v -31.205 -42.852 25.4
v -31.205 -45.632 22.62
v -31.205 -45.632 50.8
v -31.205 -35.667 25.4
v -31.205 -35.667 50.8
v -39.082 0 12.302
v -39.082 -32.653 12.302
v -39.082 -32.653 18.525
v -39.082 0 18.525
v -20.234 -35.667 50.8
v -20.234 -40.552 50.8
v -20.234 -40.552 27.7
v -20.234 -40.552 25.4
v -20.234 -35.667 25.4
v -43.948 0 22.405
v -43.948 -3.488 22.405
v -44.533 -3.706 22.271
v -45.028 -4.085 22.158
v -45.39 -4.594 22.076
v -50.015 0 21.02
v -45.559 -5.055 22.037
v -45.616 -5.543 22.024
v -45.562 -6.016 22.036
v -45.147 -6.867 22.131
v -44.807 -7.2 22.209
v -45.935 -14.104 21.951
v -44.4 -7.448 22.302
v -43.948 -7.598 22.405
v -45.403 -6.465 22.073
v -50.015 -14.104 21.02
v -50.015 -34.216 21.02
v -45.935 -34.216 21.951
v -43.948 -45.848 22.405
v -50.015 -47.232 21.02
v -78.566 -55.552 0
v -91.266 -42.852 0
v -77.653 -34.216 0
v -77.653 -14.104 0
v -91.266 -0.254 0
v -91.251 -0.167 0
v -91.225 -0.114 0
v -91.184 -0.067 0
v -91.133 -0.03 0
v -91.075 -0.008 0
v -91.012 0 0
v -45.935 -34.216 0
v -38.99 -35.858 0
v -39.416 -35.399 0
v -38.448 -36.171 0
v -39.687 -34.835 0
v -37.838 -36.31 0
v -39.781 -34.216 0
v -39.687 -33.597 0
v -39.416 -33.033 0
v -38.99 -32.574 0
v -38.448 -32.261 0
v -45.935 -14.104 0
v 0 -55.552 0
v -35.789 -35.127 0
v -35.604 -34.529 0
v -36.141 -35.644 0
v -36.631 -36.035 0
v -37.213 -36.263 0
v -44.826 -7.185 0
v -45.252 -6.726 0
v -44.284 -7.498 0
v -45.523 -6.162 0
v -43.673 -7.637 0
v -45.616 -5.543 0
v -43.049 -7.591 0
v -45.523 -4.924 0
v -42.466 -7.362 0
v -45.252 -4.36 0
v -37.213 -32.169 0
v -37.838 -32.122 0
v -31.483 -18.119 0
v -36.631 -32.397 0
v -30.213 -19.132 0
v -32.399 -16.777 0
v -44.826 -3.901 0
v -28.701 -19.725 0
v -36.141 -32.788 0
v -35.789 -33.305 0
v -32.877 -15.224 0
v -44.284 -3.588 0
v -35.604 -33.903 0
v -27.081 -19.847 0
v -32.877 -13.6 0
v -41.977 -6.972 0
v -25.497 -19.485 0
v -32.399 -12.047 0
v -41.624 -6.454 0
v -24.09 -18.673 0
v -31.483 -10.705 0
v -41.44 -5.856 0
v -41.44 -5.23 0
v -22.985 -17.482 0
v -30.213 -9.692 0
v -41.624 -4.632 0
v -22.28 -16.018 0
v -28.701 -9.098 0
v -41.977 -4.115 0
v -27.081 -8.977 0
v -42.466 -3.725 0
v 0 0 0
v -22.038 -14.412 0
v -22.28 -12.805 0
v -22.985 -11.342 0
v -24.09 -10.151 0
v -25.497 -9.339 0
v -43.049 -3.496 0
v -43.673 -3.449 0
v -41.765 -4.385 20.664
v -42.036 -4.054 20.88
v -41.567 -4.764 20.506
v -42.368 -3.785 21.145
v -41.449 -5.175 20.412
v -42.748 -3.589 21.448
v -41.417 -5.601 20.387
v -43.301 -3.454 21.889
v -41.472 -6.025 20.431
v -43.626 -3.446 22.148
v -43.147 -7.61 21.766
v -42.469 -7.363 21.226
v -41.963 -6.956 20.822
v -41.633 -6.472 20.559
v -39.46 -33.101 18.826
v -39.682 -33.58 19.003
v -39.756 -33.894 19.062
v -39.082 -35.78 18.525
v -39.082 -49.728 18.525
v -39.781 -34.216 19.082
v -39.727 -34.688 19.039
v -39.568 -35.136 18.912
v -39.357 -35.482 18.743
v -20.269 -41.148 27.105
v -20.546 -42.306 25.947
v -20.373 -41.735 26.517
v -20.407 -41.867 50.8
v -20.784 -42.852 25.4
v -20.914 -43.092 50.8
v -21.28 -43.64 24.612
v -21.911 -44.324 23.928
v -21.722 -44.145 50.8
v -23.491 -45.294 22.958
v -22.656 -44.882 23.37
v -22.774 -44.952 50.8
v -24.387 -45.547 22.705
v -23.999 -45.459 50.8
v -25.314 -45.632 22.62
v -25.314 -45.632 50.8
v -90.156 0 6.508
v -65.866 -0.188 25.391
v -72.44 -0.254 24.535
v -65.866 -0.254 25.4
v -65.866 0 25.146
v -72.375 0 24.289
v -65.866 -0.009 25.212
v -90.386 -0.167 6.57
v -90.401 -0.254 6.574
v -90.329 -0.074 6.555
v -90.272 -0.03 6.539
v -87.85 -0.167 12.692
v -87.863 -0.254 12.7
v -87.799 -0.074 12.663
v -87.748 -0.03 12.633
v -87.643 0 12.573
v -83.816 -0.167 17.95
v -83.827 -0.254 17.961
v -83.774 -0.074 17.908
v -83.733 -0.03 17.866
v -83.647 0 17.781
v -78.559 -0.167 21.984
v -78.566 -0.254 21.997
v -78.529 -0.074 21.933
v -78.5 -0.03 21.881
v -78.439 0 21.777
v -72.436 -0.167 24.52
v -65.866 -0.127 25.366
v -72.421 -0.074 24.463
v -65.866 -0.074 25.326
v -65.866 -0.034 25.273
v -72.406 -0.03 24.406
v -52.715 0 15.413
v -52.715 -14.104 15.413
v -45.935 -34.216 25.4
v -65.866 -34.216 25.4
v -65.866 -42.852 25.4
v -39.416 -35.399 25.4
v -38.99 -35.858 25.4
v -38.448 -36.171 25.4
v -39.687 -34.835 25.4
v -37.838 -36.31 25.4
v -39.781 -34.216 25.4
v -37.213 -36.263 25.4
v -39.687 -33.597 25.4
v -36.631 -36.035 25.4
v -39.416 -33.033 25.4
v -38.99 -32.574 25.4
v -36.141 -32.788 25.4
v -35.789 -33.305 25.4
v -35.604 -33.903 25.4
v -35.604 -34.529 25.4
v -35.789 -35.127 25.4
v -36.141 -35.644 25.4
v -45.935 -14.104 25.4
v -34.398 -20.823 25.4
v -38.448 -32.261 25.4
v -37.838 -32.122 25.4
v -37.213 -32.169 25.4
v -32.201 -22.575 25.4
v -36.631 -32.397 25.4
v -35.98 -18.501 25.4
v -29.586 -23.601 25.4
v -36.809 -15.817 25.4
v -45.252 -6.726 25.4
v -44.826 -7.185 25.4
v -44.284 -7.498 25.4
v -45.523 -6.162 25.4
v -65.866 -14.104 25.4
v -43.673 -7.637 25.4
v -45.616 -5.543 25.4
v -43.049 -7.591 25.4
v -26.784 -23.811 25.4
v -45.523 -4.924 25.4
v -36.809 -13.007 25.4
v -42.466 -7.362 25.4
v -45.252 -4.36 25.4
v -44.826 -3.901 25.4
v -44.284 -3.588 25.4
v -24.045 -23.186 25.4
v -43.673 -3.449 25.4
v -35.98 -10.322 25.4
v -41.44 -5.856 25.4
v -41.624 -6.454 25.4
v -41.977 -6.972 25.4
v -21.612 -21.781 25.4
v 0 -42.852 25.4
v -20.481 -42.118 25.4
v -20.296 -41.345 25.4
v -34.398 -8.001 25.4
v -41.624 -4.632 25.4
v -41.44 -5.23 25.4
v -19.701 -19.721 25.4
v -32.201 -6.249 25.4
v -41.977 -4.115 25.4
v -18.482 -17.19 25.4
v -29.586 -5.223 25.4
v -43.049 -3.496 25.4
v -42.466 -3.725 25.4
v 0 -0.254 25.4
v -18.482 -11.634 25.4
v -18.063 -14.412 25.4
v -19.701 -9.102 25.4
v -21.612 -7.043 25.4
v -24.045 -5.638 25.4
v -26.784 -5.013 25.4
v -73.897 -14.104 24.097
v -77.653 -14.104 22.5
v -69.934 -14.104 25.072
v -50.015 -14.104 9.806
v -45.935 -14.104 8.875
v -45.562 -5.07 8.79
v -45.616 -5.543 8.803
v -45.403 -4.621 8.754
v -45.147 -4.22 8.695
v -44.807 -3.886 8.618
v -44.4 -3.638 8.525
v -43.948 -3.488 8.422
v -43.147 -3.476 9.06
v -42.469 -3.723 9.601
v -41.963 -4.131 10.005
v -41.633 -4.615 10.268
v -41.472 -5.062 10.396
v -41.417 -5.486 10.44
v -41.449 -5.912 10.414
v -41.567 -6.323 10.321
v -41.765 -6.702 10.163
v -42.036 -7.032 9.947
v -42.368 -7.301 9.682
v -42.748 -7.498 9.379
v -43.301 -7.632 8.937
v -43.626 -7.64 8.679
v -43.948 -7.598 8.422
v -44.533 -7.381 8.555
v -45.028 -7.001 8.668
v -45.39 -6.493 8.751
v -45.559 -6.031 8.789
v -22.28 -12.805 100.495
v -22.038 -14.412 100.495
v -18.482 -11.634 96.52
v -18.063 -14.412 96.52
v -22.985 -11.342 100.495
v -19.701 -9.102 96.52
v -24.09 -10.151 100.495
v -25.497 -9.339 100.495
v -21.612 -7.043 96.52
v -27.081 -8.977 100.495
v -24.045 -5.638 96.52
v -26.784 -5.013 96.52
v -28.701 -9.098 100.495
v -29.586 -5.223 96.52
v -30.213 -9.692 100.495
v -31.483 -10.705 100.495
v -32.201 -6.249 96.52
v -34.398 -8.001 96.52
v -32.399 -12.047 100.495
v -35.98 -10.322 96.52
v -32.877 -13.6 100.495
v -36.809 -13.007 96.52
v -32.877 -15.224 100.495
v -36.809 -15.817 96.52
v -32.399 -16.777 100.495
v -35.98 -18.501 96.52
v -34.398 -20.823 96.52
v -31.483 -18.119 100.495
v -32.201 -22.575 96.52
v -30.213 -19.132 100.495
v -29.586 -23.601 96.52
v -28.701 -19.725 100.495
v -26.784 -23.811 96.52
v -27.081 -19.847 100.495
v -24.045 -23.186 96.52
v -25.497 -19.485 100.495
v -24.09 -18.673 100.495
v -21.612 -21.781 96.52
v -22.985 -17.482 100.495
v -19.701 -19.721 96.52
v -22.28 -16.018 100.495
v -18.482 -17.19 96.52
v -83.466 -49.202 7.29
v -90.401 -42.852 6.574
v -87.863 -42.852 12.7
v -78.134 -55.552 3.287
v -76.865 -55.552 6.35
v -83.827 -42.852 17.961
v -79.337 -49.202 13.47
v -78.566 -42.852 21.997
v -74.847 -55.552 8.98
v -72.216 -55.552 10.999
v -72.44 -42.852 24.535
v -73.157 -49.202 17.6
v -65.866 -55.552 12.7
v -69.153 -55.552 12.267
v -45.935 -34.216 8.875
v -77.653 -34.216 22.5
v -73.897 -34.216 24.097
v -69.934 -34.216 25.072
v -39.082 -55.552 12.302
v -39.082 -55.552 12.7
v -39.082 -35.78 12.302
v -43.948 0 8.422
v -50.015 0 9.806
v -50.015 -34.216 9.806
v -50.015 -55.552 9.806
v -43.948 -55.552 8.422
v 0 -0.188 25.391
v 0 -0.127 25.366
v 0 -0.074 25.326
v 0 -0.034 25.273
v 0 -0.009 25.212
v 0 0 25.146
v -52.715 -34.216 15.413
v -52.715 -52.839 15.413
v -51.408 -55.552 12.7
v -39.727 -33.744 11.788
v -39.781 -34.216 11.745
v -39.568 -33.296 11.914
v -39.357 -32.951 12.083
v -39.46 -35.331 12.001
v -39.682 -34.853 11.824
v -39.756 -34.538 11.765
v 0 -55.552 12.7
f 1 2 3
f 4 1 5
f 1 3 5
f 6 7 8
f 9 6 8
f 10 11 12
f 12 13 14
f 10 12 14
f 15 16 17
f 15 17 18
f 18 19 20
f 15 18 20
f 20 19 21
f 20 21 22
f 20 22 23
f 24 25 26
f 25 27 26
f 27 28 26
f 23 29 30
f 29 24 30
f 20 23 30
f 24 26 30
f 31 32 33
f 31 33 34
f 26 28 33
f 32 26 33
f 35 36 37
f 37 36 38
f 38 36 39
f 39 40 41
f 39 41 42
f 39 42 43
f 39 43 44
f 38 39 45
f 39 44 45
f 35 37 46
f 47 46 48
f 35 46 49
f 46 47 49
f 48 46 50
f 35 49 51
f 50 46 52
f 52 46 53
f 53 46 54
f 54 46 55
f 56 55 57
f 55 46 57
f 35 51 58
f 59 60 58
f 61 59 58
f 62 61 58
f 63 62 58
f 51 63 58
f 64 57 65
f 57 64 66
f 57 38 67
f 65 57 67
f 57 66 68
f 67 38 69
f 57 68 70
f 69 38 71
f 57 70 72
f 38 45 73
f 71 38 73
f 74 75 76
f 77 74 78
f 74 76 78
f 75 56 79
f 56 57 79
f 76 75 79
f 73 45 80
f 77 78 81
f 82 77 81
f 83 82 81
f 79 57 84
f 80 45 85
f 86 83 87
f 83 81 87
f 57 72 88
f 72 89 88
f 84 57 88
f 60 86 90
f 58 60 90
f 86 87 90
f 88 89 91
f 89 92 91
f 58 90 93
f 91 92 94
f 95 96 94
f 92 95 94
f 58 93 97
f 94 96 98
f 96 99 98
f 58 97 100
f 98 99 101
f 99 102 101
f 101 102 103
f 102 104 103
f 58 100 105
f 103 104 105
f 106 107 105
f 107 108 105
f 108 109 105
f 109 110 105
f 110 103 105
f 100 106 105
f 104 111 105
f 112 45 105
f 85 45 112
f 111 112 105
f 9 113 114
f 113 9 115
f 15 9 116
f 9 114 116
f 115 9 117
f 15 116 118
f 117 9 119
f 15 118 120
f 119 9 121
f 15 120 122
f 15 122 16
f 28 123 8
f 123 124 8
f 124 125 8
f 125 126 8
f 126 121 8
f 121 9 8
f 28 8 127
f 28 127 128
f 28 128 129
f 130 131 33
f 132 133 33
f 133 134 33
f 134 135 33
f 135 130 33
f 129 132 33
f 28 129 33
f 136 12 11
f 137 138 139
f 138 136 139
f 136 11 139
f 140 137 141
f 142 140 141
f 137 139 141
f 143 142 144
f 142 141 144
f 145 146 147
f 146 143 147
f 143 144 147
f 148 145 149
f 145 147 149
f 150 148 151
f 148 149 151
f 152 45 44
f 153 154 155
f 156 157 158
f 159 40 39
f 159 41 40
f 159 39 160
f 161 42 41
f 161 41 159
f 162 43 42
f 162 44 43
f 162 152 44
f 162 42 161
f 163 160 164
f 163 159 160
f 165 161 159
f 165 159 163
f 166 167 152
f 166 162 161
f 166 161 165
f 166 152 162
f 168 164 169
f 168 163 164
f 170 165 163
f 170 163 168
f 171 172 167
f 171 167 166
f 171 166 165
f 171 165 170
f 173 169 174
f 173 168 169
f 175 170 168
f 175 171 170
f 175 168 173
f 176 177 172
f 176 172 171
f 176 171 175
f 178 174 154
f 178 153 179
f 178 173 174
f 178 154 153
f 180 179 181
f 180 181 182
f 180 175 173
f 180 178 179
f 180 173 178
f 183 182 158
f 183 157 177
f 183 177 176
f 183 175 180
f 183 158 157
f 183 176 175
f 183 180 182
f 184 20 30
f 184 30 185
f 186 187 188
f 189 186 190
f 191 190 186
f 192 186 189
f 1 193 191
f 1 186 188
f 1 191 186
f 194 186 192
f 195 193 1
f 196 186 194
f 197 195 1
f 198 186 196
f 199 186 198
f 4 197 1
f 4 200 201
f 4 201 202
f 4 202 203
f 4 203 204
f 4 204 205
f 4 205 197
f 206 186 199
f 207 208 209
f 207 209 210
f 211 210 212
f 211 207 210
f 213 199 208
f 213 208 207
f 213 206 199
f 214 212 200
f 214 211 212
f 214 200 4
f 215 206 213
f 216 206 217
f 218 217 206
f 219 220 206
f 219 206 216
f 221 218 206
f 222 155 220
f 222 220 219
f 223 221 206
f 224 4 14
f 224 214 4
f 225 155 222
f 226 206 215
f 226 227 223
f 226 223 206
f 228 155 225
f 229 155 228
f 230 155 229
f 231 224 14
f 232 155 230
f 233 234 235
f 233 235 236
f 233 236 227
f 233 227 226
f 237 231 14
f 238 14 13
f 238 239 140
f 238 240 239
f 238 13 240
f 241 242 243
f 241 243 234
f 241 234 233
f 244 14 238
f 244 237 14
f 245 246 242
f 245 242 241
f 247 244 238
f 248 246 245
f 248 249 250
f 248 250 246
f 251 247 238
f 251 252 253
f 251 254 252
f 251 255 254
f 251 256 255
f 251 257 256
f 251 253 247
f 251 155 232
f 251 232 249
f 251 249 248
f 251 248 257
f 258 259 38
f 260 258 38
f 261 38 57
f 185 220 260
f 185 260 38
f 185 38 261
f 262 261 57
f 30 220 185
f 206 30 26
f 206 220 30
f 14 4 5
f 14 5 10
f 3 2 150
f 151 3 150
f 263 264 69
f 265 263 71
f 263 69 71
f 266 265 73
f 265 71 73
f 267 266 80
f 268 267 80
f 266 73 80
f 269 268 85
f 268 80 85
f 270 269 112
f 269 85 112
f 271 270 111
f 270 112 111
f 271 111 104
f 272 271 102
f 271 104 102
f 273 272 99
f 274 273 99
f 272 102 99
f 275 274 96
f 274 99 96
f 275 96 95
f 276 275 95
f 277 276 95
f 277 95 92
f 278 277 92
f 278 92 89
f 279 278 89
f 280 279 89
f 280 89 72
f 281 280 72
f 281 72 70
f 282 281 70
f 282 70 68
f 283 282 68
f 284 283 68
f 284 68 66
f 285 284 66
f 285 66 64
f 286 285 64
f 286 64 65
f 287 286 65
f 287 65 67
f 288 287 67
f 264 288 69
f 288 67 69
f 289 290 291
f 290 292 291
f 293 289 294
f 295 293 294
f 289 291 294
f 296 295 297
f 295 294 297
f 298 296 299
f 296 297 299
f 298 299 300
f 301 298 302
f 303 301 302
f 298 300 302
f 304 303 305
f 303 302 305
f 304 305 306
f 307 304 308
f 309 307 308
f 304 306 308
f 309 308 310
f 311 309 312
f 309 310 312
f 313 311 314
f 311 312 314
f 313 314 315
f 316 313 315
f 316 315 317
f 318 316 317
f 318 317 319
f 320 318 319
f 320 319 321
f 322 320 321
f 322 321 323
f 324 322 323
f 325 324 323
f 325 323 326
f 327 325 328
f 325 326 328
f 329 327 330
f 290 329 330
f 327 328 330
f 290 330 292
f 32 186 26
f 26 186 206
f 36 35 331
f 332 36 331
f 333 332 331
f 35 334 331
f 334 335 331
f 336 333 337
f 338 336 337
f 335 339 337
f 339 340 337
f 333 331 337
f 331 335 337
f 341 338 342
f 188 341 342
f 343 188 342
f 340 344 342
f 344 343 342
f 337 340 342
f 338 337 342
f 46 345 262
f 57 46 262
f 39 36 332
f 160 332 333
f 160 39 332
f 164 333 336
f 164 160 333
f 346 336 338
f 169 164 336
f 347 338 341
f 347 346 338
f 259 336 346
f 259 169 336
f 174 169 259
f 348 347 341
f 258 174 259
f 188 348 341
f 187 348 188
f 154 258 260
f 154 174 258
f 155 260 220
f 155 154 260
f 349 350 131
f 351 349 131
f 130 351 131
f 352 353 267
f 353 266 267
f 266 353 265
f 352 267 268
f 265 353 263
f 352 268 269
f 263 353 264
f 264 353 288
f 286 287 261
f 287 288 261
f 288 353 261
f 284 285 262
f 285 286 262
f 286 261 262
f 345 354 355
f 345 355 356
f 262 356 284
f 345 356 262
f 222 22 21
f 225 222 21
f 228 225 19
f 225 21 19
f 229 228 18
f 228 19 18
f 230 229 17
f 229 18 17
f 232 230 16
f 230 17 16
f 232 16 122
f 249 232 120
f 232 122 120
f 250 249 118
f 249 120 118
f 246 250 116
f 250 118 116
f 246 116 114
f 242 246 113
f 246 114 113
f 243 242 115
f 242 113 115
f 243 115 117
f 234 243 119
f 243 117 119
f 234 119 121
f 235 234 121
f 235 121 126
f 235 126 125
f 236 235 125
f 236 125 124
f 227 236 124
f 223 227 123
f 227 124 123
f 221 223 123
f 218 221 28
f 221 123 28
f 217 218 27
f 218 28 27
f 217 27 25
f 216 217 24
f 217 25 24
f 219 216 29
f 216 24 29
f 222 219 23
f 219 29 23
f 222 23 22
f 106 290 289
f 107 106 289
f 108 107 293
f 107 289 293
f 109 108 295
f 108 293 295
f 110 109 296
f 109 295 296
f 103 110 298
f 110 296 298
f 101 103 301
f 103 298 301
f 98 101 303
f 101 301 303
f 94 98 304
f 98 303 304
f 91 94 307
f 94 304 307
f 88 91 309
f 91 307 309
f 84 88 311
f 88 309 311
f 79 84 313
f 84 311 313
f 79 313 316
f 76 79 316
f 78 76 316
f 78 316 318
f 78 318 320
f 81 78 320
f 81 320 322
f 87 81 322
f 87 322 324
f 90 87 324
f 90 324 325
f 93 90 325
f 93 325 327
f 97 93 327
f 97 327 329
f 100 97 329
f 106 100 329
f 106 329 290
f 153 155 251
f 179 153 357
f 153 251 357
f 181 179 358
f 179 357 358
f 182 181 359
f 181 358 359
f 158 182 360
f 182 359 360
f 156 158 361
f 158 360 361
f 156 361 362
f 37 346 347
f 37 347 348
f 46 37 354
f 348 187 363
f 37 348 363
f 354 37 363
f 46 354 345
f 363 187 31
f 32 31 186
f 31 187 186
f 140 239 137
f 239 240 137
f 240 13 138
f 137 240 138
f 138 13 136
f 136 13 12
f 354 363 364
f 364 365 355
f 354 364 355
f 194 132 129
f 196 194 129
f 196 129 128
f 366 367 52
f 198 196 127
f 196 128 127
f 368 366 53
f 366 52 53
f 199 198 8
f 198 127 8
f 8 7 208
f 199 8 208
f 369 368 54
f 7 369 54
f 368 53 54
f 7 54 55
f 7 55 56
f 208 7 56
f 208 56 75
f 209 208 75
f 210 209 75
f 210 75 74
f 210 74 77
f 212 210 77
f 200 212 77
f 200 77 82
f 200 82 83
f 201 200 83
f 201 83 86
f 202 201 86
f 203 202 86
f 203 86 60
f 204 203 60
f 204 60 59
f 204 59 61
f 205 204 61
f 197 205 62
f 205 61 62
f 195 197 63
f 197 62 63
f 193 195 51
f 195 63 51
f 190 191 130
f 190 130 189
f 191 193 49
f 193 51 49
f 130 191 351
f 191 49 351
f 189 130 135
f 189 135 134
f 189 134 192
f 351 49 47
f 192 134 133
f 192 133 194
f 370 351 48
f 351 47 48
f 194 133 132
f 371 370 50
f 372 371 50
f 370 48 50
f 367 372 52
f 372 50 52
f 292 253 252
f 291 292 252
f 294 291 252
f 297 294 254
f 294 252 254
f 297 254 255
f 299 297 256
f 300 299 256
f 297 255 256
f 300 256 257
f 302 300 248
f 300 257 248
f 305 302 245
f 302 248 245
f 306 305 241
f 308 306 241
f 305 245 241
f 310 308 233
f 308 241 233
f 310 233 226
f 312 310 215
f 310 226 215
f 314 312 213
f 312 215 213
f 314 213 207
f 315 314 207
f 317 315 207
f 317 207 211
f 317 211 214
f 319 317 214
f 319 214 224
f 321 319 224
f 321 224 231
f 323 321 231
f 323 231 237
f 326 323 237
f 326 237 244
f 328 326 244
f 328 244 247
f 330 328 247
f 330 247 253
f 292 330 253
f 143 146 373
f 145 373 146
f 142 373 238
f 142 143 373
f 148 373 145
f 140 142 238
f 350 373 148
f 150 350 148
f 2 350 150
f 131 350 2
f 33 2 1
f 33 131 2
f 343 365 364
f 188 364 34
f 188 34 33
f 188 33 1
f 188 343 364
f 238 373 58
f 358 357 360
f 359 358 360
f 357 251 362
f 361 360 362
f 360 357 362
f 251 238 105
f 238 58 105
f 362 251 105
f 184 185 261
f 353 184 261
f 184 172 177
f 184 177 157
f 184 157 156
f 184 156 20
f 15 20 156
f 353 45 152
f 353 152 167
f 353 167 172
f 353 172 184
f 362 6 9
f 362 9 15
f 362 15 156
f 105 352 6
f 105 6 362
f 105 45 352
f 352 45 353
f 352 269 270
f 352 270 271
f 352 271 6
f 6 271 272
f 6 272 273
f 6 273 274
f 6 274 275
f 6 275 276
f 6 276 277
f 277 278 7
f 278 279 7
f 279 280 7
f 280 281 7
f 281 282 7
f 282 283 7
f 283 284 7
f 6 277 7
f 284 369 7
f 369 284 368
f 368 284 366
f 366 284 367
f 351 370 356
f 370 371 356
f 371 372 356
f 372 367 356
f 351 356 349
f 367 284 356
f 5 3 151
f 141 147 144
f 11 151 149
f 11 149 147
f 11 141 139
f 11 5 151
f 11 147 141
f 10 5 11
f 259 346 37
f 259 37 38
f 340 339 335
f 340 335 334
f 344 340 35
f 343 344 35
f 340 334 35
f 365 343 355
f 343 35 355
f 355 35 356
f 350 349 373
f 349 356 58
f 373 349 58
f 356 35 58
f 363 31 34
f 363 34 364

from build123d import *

# Parameters (mm, degrees)
F0_W          = 91.2663862109
F0_H          = 55.5524304509
F1_DEPTH      = 25.4
F2_W          = 31.717389822
F2_H          = 20.1121037826
F3_DEPTH      = 25.401
F4_R          = 9.4254777906
F5_DEPTH      = 76.2
F7_DEPTH      = 55.5534304509
F8_R          = 5.4499976888
F9_DEPTH      = 101.601
F10_W         = 10.9715163708
F10_H         = 9.965904057
F11_DEPTH     = 25.4
F12_T1_DEPTH  = 182.5524304509
F13_T4_DEPTH  = 98.5267601581
F13_T10_DEPTH = 98.5267601581
F13_T16_DEPTH = 98.5267601581
F13_T23_DEPTH = 98.5267601581
F13_T29_DEPTH = 98.5267601581
F13_T33_ANGLE = 163.70288589
F15_T4_DEPTH  = 53.5800548494
F15_T10_DEPTH = 53.5800548494
F15_T16_DEPTH = 53.5800548494
F17_D         = 4.2
F18_R         = 0.254


# Not quite as in the source:
# - a fillet or chamfer that OpenCascade refuses, or shapes differently, is made with other operations: its cross-section is extruded or revolved along the edge and cut away or added


with BuildPart() as f1:
    # F0 (on Top) → F1 (new body)
    with BuildSketch(Plane.XY):
        with Locations((-45.6331931055, -27.7762152255)):
            Rectangle(F0_W, F0_H)
    extrude(amount=F1_DEPTH)

    # F2 (on face) → F3 (cut, through all)
    with BuildSketch(Plane.XY.offset(25.4)):
        with Locations((-61.7938265204, -24.1600726731)):
            Rectangle(F2_W, F2_H)
    extrude(amount=-F3_DEPTH, mode=Mode.SUBTRACT)

    # F4 (on face) → F5 (join)
    with BuildSketch(Plane.XY.offset(25.4)):
        with Locations((-27.4883341044, -14.4118471071)):
            Circle(F4_R)
    extrude(amount=F5_DEPTH)

    # F6 (on face) → F7 (cut, through all)
    with BuildSketch(Plane.XZ.offset(55.5524304509)):
        Polygon((-39.0824638307, 12.301723844), (-39.0824638307, 18.5248410342), (-43.9478927691, 22.4048911381), (-50.0149834187, 21.0201172888), (-52.7150927741, 15.4132824391), (-50.0149834187, 9.8064475894), (-43.9478927691, 8.4216737401), align=None)
    extrude(amount=-F7_DEPTH, mode=Mode.SUBTRACT)

    # F8 (on face) → F9 (cut, through all)
    with BuildSketch(Plane.XY.offset(101.6)):
        with Locations((-27.4883341044, -14.4118471071)):
            Circle(F8_R)
    extrude(amount=-F9_DEPTH, mode=Mode.SUBTRACT)

    # F10 (on face) → F11 (join)
    with BuildSketch(Plane.XY.offset(25.4)):
        with Locations((-25.7194377482, -40.6495332718)):
            Rectangle(F10_W, F10_H)
    extrude(amount=F11_DEPTH)

    # F12: fillet of radius 25.4 on 1 edges, made by hand

    # F12_s2 → F12_t1 (cut)
    with BuildSketch(Plane.XZ.offset(-63.5)):
        with BuildLine():
            ThreePointArc((-91.2663862109, 0), (-83.8268984531, 17.9605122421), (-65.8663862109, 25.4))
            Line((-65.8663862109, 25.4), (-91.2663862109, 25.4))
            Line((-91.2663862109, 25.4), (-91.2663862109, 0))
        make_face()
    extrude(amount=F12_T1_DEPTH, mode=Mode.SUBTRACT)

    # F13: chamfer of 12.7 on 1 edges, made by hand


with BuildPart() as f13_tool2:
    # F13_s3 → F13_t4 (new body)
    with BuildSketch(Plane.YZ.offset(-65.8663862109)):
        Polygon((-55.5524304509, 12.7), (-42.8524304509, 25.4), (-55.5524304509, 25.4), align=None)
    extrude(amount=F13_T4_DEPTH)

    split(bisect_by=Plane.YZ.offset(-31.2051959336), keep=Keep.BOTTOM)

    split(bisect_by=Plane.XZ.offset(45.6324853003), keep=Keep.TOP)


with BuildPart() as f1_1:
    add(f1.part)

    # F13_t1: cut F13_tool2
    add(f13_tool2.part, mode=Mode.SUBTRACT)


with BuildPart() as f13_tool8:
    # F13_s9 → F13_t10 (new body)
    with BuildSketch(Plane.YZ.offset(-65.8663862109)):
        Polygon((-55.5524304509, 12.7), (-42.8524304509, 25.4), (-55.5524304509, 25.4), align=None)
    extrude(amount=F13_T10_DEPTH)

    split(bisect_by=Plane.YZ.offset(-31.2051959336), keep=Keep.BOTTOM)

    split(bisect_by=Plane.XZ.offset(45.6324853003), keep=Keep.BOTTOM)


with BuildPart() as f1_2:
    add(f1_1.part)

    # F13_t7: cut F13_tool8
    add(f13_tool8.part, mode=Mode.SUBTRACT)


with BuildPart() as f13_tool14:
    # F13_s15 → F13_t16 (new body)
    with BuildSketch(Plane.YZ.offset(-65.8663862109)):
        Polygon((-55.5524304509, 12.7), (-42.8524304509, 25.4), (-55.5524304509, 25.4), align=None)
    extrude(amount=F13_T16_DEPTH)

    split(bisect_by=Plane.YZ.offset(-20.2336795628), keep=Keep.BOTTOM)

    split(bisect_by=Plane.YZ.offset(-31.2051959336), keep=Keep.TOP)

    split(bisect_by=Plane.XZ.offset(45.6324853003), keep=Keep.TOP)


with BuildPart() as f1_3:
    add(f1_2.part)

    # F13_t13: cut F13_tool14
    add(f13_tool14.part, mode=Mode.SUBTRACT)


with BuildPart() as f13_tool21:
    # F13_s22 → F13_t23 (new body)
    with BuildSketch(Plane.YZ.offset(-65.8663862109)):
        Polygon((-55.5524304509, 12.7), (-42.8524304509, 25.4), (-55.5524304509, 25.4), align=None)
    extrude(amount=F13_T23_DEPTH)

    split(bisect_by=Plane.YZ.offset(-20.2336795628), keep=Keep.TOP)

    split(bisect_by=Plane.XZ.offset(45.6324853003), keep=Keep.TOP)


with BuildPart() as f1_4:
    add(f1_3.part)

    # F13_t20: cut F13_tool21
    add(f13_tool21.part, mode=Mode.SUBTRACT)


with BuildPart() as f13_tool27:
    # F13_s28 → F13_t29 (new body)
    with BuildSketch(Plane.YZ.offset(-65.8663862109)):
        Polygon((-55.5524304509, 12.7), (-42.8524304509, 25.4), (-55.5524304509, 25.4), align=None)
    extrude(amount=F13_T29_DEPTH)

    split(bisect_by=Plane.YZ.offset(-20.2336795628), keep=Keep.TOP)

    split(bisect_by=Plane.XZ.offset(45.6324853003), keep=Keep.BOTTOM)


with BuildPart() as f1_5:
    add(f1_4.part)

    # F13_t26: cut F13_tool27
    add(f13_tool27.part, mode=Mode.SUBTRACT)

    # F13_s32 → F13_t33 (revolve, cut)
    with BuildSketch(Plane(origin=(-60.6796278509, 0, 17.7406473118), x_dir=(0, 1, 0), z_dir=(0.9598194275, 0, -0.2806183648))):
        Polygon((-42.8524304509, -43.8833175952), (-55.5524304509, -31.1833175952), (-55.5524304509, -43.8833175952), align=None)
    revolve(axis=Axis((-65.8663862109, -55.5524304509, 0), (0, 1, 0)), revolution_arc=F13_T33_ANGLE, mode=Mode.SUBTRACT)

    # F14: chamfer of 5.08 on 1 edges, made by hand

    # F14_s1 → F14_t2 (revolve, cut)
    with BuildSketch(Plane.XZ.offset(14.4118471071)):
        Polygon((-23.1428563138, 101.6), (-18.0628563138, 96.52), (-18.0628563138, 101.6), align=None)
    revolve(axis=Axis((-27.4883341044, -14.4118471071, 101.6), (0, 0, 1)), mode=Mode.SUBTRACT)

    # F15: fillet of radius 5.08 on 1 edges, made by hand


with BuildPart() as f15_tool2:
    # F15_s3 → F15_t4 (new body)
    with BuildSketch(Plane.XY.offset(63.5)):
        with BuildLine():
            ThreePointArc((-20.2336795628, -40.5524853003), (-21.7215771144, -44.1445877487), (-25.3136795628, -45.6324853003))
            Line((-25.3136795628, -45.6324853003), (-20.2336795628, -45.6324853003))
            Line((-20.2336795628, -45.6324853003), (-20.2336795628, -40.5524853003))
        make_face()
    extrude(amount=-F15_T4_DEPTH)

    split(bisect_by=Plane.XY.offset(25.4), keep=Keep.TOP)

    split(bisect_by=Plane(origin=(0, -34.1262152254, 34.1262152254), x_dir=(1, 0, 0), z_dir=(0, -0.7071067812, 0.7071067812)), keep=Keep.TOP)


with BuildPart() as f1_6:
    add(f1_5.part)

    # F15_t1: cut F15_tool2
    add(f15_tool2.part, mode=Mode.SUBTRACT)


with BuildPart() as f15_tool8:
    # F15_s9 → F15_t10 (new body)
    with BuildSketch(Plane.XY.offset(63.5)):
        with BuildLine():
            ThreePointArc((-20.2336795628, -40.5524853003), (-21.7215771144, -44.1445877487), (-25.3136795628, -45.6324853003))
            Line((-25.3136795628, -45.6324853003), (-20.2336795628, -45.6324853003))
            Line((-20.2336795628, -45.6324853003), (-20.2336795628, -40.5524853003))
        make_face()
    extrude(amount=-F15_T10_DEPTH)

    split(bisect_by=Plane.XY.offset(25.4), keep=Keep.BOTTOM)

    split(bisect_by=Plane(origin=(0, -34.1262152255, 34.1262152254), x_dir=(1, 0, 0), z_dir=(0, -0.7071067812, 0.7071067812)), keep=Keep.TOP)


with BuildPart() as f1_7:
    add(f1_6.part)

    # F15_t7: cut F15_tool8
    add(f15_tool8.part, mode=Mode.SUBTRACT)


with BuildPart() as f15_tool14:
    # F15_s15 → F15_t16 (new body)
    with BuildSketch(Plane.XY.offset(63.5)):
        with BuildLine():
            ThreePointArc((-20.2336795628, -40.5524853003), (-21.7215771144, -44.1445877487), (-25.3136795628, -45.6324853003))
            Line((-25.3136795628, -45.6324853003), (-20.2336795628, -45.6324853003))
            Line((-20.2336795628, -45.6324853003), (-20.2336795628, -40.5524853003))
        make_face()
    extrude(amount=-F15_T16_DEPTH)

    split(bisect_by=Plane.XY.offset(25.4), keep=Keep.TOP)

    split(bisect_by=Plane(origin=(0, -34.1262152255, 34.1262152254), x_dir=(1, 0, 0), z_dir=(0, 0.7071067812, -0.7071067812)), keep=Keep.TOP)


with BuildPart() as f1_8:
    add(f1_7.part)

    # F15_t13: cut F15_tool14
    add(f15_tool14.part, mode=Mode.SUBTRACT)

    # F17 (through all)
    with Locations(Plane.XY.offset(25.4)):
        with Locations((-37.6806370914, -34.2161245644), (-43.5164868832, -5.5432366207)):
            Hole(F17_D / 2)

    # F18
    f18_edges = [f1_8.edges().sort_by_distance(p)[0] for p in [
        (-83.826898, 0, 17.960512),
    ]]
    fillet(f18_edges, radius=F18_R)


solid = f1_8.part
